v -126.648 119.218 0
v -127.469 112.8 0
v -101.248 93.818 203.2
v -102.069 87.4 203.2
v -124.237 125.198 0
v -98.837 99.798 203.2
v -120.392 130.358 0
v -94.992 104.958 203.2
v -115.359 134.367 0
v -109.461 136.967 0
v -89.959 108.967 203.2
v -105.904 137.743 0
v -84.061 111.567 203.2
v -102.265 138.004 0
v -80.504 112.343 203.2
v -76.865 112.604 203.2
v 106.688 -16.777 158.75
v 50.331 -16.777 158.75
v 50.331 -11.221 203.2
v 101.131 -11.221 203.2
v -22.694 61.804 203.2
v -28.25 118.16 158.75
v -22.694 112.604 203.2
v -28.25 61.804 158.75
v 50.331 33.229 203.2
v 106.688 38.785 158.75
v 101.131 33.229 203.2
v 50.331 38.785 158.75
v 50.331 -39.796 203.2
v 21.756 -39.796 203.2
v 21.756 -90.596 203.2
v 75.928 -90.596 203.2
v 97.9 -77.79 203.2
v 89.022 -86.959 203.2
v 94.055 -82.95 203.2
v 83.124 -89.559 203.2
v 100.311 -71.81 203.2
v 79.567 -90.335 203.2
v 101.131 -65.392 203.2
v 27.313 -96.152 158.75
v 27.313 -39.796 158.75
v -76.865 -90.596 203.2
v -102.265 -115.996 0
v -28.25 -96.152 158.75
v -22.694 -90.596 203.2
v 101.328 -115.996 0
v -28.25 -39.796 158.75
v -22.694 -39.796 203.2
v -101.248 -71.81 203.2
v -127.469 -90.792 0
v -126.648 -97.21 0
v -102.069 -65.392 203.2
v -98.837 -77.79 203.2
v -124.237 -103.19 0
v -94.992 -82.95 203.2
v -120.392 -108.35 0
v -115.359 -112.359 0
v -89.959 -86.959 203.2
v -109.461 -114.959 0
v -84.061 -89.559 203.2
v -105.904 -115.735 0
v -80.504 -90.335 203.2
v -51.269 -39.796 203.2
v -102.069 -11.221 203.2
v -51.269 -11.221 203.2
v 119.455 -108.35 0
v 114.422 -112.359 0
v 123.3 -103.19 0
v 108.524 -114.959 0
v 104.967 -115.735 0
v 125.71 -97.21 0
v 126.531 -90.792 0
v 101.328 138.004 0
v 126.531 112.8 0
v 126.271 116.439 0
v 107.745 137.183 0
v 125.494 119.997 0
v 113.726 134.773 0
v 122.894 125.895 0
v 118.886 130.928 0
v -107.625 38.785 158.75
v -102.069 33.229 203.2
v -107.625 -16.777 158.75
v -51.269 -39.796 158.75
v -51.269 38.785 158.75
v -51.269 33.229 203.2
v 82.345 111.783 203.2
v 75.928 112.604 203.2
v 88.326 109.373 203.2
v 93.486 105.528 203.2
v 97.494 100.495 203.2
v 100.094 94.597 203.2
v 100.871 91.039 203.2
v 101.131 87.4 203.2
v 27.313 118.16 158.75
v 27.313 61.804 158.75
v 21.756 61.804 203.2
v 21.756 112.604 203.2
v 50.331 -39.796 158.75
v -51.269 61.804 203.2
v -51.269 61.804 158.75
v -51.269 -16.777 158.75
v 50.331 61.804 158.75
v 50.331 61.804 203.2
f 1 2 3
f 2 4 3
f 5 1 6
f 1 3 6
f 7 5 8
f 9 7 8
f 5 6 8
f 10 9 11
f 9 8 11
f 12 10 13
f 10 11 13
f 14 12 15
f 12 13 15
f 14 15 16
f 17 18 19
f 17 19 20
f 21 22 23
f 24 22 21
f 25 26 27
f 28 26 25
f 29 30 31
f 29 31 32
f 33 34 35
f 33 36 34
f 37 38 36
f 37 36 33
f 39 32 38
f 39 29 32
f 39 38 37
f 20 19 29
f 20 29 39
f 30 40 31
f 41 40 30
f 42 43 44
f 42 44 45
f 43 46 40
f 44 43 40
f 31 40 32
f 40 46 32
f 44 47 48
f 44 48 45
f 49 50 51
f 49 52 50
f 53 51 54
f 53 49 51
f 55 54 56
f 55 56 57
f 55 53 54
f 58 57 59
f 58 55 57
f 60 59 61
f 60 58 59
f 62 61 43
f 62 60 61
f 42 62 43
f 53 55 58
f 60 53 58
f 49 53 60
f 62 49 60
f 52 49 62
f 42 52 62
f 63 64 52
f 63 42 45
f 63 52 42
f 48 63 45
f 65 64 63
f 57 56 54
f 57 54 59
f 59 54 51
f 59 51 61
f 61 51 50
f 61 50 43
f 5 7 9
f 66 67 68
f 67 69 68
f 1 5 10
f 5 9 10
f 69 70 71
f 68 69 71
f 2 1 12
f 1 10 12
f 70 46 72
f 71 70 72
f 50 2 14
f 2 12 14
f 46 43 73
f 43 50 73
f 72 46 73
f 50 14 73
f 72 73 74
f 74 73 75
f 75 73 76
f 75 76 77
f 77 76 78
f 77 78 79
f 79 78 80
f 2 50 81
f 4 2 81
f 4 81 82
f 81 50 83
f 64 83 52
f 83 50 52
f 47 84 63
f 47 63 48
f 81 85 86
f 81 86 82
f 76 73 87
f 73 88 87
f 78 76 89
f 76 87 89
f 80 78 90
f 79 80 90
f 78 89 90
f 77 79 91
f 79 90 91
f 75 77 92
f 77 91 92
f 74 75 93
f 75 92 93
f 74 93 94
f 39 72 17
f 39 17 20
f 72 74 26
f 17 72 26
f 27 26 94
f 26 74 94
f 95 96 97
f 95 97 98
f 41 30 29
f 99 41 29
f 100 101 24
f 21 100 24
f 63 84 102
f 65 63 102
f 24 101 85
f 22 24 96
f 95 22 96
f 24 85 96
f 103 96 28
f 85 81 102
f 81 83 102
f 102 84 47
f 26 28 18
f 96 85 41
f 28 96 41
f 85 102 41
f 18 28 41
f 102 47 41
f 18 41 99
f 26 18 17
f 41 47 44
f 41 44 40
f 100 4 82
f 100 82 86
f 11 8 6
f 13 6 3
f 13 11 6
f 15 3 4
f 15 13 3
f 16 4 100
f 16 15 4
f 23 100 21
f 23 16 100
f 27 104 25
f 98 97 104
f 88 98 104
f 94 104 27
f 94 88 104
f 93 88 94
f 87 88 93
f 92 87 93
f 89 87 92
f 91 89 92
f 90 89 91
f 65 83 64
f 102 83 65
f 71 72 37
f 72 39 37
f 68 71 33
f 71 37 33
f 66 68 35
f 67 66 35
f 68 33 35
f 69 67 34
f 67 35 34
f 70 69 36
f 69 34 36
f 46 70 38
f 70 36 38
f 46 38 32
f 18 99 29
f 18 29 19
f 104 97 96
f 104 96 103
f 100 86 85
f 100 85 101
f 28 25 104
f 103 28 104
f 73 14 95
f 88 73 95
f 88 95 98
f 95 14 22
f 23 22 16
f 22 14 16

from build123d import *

# Parameters (mm, degrees)
F0_W     = 254
F0_H     = 254
F1_DEPTH = 203.2
F1_TAPER = 7.125
F2_R     = 25.4
F4_DEPTH = 44.45
F4_TAPER = -7.125
F5_W     = 101.6
F5_H     = 101.6
F6_DEPTH = 44.45


with BuildPart() as f1:
    # F0 (on Top) → F1 (new body)
    with BuildSketch(Plane.XY):
        with Locations((-0.4685800523, 11.0039802372)):
            Rectangle(F0_W, F0_H)
    extrude(amount=F1_DEPTH, taper=F1_TAPER)

    # F2
    f2_edges = [f1.edges().sort_by_distance(p)[0] for p in [
        (-114.768609, -103.296049, 101.6),
        (113.831449, -103.296049, 101.6),
        (113.831449, 125.304009, 101.600004),
        (-114.768609, 125.30401, 101.6),
    ]]
    fillet(f2_edges, radius=F2_R)

    # F3 (on face) → F4 (cut)
    with BuildSketch(Plane.XY.offset(203.2)):
        Polygon((-22.6936389397, 33.2289213498), (-102.0686389397, 33.2289213498), (-102.0686389397, -11.2210786502), (-22.6936389397, -11.2210786502), (-22.6936389397, -90.5960786502), (21.7563610603, -90.5960786502), (21.7563610603, -11.2210786502), (101.1314788352, -11.2210786502), (101.1314788352, 33.2289213498), (21.7563610603, 33.2289213498), (21.7563610603, 112.6040391247), (-22.6936389397, 112.6040391247), align=None)
    extrude(amount=-F4_DEPTH, taper=F4_TAPER, mode=Mode.SUBTRACT)

    # F5 (on face) → F6 (cut)
    with BuildSketch(Plane.XY.offset(203.2)):
        with Locations((-0.4685211648, 11.0039213498)):
            Rectangle(F5_W, F5_H)
    extrude(amount=-F6_DEPTH, mode=Mode.SUBTRACT)


solid = f1.part
